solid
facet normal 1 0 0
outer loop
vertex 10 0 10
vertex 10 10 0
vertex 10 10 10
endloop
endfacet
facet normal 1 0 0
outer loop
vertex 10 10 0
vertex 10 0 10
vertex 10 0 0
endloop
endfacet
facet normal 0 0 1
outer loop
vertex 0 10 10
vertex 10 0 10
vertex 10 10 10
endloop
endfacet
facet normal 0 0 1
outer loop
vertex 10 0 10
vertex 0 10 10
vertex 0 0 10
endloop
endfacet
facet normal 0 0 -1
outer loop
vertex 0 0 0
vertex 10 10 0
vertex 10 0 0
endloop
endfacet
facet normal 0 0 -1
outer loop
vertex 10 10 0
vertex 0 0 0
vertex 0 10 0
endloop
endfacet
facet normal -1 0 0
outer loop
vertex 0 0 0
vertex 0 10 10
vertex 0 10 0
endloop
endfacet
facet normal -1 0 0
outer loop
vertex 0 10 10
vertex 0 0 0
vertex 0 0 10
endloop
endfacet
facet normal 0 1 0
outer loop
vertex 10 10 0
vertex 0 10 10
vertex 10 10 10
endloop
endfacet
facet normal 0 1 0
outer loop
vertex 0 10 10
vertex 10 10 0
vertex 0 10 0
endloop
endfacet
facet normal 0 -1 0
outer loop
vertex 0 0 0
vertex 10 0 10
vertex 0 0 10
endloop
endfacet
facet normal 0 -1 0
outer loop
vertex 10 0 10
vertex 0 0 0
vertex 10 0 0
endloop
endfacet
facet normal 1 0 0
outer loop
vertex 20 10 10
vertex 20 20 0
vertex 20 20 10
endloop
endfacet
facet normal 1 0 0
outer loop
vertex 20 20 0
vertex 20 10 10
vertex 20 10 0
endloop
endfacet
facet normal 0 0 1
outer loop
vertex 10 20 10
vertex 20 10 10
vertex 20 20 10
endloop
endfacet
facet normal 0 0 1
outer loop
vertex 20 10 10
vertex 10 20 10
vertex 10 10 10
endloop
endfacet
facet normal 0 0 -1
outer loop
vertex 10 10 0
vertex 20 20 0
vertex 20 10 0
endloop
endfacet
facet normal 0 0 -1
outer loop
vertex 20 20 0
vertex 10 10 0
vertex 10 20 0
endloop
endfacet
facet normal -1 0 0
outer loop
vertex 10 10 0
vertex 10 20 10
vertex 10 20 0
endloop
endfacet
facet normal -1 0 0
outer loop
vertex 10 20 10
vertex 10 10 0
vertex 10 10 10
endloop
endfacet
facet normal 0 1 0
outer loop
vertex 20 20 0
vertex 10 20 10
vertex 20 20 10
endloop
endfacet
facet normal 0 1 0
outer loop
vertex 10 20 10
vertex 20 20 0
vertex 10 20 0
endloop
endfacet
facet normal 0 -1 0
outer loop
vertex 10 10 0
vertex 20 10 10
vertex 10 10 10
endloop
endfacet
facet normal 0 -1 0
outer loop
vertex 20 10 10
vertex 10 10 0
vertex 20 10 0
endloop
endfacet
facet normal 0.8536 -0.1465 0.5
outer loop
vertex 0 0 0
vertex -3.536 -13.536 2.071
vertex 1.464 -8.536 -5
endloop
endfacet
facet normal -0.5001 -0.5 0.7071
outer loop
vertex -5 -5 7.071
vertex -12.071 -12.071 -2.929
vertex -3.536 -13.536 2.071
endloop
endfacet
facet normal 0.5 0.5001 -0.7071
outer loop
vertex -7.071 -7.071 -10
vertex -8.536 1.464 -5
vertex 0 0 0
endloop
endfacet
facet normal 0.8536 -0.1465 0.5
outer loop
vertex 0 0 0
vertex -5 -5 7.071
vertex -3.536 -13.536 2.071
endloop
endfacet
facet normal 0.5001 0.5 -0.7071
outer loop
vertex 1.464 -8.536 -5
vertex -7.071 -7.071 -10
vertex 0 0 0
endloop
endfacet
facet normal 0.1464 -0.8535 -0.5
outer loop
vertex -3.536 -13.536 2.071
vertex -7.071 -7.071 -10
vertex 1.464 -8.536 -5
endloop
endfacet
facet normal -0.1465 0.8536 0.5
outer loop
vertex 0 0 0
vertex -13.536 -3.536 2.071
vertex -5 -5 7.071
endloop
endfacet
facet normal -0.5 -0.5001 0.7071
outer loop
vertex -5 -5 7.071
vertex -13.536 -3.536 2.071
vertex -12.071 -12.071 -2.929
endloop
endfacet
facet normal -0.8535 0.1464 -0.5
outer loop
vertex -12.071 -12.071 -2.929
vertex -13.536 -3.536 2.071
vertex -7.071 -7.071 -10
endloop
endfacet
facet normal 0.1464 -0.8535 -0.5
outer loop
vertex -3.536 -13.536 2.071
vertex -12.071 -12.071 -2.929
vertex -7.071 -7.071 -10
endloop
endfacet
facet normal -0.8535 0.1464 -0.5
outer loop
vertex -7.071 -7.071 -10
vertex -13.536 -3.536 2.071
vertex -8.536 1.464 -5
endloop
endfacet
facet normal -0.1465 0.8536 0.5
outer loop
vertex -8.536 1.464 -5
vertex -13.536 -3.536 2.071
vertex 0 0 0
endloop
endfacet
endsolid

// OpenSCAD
cube([10,10,10]);
translate([10,10,0]) cube([10,10,10]);

rotate([45,45,45]) translate([-10,-10,-10]) cube([10,10,10]);
